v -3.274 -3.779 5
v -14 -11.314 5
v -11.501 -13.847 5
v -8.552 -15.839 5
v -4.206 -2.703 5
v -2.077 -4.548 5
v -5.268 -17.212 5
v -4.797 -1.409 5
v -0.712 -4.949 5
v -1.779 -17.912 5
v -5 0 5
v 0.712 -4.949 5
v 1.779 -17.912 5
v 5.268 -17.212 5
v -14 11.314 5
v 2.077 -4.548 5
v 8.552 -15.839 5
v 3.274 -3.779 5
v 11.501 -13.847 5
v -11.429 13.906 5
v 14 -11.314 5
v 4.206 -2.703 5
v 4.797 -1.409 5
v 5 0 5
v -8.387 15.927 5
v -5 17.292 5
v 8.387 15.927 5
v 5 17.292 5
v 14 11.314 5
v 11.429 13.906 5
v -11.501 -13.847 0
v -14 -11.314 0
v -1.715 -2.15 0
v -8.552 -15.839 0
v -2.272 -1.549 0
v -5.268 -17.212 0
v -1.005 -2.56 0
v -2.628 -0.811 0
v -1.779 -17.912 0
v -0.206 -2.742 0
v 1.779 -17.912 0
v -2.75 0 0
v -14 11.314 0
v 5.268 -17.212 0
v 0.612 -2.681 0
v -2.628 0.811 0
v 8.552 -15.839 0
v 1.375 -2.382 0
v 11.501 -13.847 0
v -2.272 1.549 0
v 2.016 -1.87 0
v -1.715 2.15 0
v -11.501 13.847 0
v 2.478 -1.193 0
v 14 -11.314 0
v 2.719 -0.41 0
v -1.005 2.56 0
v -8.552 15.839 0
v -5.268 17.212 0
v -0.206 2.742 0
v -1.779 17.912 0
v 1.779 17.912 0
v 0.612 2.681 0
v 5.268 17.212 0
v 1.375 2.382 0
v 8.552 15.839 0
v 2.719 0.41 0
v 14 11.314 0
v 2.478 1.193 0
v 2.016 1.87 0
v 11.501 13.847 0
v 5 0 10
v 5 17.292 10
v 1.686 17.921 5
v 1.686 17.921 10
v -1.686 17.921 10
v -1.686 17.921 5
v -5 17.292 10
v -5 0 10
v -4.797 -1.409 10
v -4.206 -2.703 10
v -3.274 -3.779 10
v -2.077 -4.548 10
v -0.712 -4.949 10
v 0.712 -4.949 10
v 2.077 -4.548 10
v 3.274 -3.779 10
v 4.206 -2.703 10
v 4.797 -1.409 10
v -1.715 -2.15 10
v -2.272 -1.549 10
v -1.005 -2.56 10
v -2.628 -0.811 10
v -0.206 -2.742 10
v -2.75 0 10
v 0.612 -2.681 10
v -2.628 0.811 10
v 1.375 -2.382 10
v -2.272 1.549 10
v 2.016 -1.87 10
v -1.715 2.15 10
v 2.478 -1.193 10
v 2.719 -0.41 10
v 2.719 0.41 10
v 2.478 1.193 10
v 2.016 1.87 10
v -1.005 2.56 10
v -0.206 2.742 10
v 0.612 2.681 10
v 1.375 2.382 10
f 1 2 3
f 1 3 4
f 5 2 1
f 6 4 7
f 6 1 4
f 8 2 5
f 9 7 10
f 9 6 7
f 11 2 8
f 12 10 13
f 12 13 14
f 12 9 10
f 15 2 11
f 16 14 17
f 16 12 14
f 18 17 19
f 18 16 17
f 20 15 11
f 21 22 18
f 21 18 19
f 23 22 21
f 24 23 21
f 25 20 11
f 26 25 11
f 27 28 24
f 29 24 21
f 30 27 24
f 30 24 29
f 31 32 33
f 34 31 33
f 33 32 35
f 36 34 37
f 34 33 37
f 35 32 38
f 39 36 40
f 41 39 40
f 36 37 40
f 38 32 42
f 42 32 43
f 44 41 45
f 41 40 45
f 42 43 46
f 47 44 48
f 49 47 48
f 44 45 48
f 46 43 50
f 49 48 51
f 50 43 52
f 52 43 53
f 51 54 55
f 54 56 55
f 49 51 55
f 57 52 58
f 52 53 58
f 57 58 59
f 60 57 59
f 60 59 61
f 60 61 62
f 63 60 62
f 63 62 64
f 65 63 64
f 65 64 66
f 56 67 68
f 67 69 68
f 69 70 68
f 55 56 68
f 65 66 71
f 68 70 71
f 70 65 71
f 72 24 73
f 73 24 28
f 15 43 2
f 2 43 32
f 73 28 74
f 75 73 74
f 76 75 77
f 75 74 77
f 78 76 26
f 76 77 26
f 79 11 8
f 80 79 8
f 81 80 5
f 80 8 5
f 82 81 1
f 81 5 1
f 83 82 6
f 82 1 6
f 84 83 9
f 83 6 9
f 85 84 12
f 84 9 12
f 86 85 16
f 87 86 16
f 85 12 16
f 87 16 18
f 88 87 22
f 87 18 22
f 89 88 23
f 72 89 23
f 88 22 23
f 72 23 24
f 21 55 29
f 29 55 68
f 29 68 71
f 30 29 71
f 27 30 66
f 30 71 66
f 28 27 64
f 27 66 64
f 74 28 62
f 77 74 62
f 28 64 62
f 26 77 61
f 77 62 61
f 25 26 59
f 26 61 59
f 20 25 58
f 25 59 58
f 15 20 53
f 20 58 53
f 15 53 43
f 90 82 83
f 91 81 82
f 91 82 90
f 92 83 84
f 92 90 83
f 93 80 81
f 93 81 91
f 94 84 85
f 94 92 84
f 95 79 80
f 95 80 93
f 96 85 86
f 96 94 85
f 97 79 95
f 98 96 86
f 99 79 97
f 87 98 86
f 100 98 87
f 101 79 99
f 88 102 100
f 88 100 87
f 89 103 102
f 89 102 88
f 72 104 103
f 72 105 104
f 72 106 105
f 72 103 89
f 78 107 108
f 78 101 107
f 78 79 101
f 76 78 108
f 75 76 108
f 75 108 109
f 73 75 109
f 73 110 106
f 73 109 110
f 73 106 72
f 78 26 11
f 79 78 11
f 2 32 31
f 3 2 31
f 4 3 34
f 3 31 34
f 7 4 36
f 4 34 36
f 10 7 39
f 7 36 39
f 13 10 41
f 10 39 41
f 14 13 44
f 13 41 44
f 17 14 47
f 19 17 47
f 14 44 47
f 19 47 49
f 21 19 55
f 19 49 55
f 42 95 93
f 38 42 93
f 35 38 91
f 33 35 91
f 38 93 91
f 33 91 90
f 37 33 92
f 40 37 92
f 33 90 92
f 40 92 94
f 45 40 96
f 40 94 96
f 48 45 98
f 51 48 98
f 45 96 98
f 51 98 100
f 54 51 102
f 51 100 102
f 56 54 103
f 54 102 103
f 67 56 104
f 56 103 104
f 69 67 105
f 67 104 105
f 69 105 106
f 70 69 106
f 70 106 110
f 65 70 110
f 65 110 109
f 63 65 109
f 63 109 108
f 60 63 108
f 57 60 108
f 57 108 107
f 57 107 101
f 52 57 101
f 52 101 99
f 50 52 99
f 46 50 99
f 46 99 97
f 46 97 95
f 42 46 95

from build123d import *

# Parameters (mm, degrees)
F1_DEPTH = 5
F3_DEPTH = 5
F5_D     = 5.5


with BuildPart() as f1:
    # F0 (on Top) → F1 (new body)
    with BuildSketch(Plane.XY):
        with BuildLine():
            Line((-14, 11.313708499), (-14, -11.313708499))
            ThreePointArc((-14, -11.313708499), (0, -18), (14, -11.313708499))
            Line((14, -11.313708499), (14, 11.313708499))
            ThreePointArc((14, 11.313708499), (0, 18), (-14, 11.313708499))
        make_face()
    extrude(amount=F1_DEPTH)

    # F2 (on face) → F3 (join)
    with BuildSketch(Plane.XY.offset(5)):
        with BuildLine():
            Line((-5, 17.2916164658), (-5, 0))
            ThreePointArc((-5, 0), (0, -5), (5, 0))
            Line((5, 0), (5, 17.2916164658))
            ThreePointArc((5, 17.2916164658), (0, 18), (-5, 17.2916164658))
        make_face()
    extrude(amount=F3_DEPTH)

    # F5 (through all)
    with Locations(Plane(origin=(0, 0, 0), x_dir=(1, 0, 0), z_dir=(0, 0, -1))):
        with Locations((0, 0)):
            Hole(F5_D / 2)


solid = f1.part
